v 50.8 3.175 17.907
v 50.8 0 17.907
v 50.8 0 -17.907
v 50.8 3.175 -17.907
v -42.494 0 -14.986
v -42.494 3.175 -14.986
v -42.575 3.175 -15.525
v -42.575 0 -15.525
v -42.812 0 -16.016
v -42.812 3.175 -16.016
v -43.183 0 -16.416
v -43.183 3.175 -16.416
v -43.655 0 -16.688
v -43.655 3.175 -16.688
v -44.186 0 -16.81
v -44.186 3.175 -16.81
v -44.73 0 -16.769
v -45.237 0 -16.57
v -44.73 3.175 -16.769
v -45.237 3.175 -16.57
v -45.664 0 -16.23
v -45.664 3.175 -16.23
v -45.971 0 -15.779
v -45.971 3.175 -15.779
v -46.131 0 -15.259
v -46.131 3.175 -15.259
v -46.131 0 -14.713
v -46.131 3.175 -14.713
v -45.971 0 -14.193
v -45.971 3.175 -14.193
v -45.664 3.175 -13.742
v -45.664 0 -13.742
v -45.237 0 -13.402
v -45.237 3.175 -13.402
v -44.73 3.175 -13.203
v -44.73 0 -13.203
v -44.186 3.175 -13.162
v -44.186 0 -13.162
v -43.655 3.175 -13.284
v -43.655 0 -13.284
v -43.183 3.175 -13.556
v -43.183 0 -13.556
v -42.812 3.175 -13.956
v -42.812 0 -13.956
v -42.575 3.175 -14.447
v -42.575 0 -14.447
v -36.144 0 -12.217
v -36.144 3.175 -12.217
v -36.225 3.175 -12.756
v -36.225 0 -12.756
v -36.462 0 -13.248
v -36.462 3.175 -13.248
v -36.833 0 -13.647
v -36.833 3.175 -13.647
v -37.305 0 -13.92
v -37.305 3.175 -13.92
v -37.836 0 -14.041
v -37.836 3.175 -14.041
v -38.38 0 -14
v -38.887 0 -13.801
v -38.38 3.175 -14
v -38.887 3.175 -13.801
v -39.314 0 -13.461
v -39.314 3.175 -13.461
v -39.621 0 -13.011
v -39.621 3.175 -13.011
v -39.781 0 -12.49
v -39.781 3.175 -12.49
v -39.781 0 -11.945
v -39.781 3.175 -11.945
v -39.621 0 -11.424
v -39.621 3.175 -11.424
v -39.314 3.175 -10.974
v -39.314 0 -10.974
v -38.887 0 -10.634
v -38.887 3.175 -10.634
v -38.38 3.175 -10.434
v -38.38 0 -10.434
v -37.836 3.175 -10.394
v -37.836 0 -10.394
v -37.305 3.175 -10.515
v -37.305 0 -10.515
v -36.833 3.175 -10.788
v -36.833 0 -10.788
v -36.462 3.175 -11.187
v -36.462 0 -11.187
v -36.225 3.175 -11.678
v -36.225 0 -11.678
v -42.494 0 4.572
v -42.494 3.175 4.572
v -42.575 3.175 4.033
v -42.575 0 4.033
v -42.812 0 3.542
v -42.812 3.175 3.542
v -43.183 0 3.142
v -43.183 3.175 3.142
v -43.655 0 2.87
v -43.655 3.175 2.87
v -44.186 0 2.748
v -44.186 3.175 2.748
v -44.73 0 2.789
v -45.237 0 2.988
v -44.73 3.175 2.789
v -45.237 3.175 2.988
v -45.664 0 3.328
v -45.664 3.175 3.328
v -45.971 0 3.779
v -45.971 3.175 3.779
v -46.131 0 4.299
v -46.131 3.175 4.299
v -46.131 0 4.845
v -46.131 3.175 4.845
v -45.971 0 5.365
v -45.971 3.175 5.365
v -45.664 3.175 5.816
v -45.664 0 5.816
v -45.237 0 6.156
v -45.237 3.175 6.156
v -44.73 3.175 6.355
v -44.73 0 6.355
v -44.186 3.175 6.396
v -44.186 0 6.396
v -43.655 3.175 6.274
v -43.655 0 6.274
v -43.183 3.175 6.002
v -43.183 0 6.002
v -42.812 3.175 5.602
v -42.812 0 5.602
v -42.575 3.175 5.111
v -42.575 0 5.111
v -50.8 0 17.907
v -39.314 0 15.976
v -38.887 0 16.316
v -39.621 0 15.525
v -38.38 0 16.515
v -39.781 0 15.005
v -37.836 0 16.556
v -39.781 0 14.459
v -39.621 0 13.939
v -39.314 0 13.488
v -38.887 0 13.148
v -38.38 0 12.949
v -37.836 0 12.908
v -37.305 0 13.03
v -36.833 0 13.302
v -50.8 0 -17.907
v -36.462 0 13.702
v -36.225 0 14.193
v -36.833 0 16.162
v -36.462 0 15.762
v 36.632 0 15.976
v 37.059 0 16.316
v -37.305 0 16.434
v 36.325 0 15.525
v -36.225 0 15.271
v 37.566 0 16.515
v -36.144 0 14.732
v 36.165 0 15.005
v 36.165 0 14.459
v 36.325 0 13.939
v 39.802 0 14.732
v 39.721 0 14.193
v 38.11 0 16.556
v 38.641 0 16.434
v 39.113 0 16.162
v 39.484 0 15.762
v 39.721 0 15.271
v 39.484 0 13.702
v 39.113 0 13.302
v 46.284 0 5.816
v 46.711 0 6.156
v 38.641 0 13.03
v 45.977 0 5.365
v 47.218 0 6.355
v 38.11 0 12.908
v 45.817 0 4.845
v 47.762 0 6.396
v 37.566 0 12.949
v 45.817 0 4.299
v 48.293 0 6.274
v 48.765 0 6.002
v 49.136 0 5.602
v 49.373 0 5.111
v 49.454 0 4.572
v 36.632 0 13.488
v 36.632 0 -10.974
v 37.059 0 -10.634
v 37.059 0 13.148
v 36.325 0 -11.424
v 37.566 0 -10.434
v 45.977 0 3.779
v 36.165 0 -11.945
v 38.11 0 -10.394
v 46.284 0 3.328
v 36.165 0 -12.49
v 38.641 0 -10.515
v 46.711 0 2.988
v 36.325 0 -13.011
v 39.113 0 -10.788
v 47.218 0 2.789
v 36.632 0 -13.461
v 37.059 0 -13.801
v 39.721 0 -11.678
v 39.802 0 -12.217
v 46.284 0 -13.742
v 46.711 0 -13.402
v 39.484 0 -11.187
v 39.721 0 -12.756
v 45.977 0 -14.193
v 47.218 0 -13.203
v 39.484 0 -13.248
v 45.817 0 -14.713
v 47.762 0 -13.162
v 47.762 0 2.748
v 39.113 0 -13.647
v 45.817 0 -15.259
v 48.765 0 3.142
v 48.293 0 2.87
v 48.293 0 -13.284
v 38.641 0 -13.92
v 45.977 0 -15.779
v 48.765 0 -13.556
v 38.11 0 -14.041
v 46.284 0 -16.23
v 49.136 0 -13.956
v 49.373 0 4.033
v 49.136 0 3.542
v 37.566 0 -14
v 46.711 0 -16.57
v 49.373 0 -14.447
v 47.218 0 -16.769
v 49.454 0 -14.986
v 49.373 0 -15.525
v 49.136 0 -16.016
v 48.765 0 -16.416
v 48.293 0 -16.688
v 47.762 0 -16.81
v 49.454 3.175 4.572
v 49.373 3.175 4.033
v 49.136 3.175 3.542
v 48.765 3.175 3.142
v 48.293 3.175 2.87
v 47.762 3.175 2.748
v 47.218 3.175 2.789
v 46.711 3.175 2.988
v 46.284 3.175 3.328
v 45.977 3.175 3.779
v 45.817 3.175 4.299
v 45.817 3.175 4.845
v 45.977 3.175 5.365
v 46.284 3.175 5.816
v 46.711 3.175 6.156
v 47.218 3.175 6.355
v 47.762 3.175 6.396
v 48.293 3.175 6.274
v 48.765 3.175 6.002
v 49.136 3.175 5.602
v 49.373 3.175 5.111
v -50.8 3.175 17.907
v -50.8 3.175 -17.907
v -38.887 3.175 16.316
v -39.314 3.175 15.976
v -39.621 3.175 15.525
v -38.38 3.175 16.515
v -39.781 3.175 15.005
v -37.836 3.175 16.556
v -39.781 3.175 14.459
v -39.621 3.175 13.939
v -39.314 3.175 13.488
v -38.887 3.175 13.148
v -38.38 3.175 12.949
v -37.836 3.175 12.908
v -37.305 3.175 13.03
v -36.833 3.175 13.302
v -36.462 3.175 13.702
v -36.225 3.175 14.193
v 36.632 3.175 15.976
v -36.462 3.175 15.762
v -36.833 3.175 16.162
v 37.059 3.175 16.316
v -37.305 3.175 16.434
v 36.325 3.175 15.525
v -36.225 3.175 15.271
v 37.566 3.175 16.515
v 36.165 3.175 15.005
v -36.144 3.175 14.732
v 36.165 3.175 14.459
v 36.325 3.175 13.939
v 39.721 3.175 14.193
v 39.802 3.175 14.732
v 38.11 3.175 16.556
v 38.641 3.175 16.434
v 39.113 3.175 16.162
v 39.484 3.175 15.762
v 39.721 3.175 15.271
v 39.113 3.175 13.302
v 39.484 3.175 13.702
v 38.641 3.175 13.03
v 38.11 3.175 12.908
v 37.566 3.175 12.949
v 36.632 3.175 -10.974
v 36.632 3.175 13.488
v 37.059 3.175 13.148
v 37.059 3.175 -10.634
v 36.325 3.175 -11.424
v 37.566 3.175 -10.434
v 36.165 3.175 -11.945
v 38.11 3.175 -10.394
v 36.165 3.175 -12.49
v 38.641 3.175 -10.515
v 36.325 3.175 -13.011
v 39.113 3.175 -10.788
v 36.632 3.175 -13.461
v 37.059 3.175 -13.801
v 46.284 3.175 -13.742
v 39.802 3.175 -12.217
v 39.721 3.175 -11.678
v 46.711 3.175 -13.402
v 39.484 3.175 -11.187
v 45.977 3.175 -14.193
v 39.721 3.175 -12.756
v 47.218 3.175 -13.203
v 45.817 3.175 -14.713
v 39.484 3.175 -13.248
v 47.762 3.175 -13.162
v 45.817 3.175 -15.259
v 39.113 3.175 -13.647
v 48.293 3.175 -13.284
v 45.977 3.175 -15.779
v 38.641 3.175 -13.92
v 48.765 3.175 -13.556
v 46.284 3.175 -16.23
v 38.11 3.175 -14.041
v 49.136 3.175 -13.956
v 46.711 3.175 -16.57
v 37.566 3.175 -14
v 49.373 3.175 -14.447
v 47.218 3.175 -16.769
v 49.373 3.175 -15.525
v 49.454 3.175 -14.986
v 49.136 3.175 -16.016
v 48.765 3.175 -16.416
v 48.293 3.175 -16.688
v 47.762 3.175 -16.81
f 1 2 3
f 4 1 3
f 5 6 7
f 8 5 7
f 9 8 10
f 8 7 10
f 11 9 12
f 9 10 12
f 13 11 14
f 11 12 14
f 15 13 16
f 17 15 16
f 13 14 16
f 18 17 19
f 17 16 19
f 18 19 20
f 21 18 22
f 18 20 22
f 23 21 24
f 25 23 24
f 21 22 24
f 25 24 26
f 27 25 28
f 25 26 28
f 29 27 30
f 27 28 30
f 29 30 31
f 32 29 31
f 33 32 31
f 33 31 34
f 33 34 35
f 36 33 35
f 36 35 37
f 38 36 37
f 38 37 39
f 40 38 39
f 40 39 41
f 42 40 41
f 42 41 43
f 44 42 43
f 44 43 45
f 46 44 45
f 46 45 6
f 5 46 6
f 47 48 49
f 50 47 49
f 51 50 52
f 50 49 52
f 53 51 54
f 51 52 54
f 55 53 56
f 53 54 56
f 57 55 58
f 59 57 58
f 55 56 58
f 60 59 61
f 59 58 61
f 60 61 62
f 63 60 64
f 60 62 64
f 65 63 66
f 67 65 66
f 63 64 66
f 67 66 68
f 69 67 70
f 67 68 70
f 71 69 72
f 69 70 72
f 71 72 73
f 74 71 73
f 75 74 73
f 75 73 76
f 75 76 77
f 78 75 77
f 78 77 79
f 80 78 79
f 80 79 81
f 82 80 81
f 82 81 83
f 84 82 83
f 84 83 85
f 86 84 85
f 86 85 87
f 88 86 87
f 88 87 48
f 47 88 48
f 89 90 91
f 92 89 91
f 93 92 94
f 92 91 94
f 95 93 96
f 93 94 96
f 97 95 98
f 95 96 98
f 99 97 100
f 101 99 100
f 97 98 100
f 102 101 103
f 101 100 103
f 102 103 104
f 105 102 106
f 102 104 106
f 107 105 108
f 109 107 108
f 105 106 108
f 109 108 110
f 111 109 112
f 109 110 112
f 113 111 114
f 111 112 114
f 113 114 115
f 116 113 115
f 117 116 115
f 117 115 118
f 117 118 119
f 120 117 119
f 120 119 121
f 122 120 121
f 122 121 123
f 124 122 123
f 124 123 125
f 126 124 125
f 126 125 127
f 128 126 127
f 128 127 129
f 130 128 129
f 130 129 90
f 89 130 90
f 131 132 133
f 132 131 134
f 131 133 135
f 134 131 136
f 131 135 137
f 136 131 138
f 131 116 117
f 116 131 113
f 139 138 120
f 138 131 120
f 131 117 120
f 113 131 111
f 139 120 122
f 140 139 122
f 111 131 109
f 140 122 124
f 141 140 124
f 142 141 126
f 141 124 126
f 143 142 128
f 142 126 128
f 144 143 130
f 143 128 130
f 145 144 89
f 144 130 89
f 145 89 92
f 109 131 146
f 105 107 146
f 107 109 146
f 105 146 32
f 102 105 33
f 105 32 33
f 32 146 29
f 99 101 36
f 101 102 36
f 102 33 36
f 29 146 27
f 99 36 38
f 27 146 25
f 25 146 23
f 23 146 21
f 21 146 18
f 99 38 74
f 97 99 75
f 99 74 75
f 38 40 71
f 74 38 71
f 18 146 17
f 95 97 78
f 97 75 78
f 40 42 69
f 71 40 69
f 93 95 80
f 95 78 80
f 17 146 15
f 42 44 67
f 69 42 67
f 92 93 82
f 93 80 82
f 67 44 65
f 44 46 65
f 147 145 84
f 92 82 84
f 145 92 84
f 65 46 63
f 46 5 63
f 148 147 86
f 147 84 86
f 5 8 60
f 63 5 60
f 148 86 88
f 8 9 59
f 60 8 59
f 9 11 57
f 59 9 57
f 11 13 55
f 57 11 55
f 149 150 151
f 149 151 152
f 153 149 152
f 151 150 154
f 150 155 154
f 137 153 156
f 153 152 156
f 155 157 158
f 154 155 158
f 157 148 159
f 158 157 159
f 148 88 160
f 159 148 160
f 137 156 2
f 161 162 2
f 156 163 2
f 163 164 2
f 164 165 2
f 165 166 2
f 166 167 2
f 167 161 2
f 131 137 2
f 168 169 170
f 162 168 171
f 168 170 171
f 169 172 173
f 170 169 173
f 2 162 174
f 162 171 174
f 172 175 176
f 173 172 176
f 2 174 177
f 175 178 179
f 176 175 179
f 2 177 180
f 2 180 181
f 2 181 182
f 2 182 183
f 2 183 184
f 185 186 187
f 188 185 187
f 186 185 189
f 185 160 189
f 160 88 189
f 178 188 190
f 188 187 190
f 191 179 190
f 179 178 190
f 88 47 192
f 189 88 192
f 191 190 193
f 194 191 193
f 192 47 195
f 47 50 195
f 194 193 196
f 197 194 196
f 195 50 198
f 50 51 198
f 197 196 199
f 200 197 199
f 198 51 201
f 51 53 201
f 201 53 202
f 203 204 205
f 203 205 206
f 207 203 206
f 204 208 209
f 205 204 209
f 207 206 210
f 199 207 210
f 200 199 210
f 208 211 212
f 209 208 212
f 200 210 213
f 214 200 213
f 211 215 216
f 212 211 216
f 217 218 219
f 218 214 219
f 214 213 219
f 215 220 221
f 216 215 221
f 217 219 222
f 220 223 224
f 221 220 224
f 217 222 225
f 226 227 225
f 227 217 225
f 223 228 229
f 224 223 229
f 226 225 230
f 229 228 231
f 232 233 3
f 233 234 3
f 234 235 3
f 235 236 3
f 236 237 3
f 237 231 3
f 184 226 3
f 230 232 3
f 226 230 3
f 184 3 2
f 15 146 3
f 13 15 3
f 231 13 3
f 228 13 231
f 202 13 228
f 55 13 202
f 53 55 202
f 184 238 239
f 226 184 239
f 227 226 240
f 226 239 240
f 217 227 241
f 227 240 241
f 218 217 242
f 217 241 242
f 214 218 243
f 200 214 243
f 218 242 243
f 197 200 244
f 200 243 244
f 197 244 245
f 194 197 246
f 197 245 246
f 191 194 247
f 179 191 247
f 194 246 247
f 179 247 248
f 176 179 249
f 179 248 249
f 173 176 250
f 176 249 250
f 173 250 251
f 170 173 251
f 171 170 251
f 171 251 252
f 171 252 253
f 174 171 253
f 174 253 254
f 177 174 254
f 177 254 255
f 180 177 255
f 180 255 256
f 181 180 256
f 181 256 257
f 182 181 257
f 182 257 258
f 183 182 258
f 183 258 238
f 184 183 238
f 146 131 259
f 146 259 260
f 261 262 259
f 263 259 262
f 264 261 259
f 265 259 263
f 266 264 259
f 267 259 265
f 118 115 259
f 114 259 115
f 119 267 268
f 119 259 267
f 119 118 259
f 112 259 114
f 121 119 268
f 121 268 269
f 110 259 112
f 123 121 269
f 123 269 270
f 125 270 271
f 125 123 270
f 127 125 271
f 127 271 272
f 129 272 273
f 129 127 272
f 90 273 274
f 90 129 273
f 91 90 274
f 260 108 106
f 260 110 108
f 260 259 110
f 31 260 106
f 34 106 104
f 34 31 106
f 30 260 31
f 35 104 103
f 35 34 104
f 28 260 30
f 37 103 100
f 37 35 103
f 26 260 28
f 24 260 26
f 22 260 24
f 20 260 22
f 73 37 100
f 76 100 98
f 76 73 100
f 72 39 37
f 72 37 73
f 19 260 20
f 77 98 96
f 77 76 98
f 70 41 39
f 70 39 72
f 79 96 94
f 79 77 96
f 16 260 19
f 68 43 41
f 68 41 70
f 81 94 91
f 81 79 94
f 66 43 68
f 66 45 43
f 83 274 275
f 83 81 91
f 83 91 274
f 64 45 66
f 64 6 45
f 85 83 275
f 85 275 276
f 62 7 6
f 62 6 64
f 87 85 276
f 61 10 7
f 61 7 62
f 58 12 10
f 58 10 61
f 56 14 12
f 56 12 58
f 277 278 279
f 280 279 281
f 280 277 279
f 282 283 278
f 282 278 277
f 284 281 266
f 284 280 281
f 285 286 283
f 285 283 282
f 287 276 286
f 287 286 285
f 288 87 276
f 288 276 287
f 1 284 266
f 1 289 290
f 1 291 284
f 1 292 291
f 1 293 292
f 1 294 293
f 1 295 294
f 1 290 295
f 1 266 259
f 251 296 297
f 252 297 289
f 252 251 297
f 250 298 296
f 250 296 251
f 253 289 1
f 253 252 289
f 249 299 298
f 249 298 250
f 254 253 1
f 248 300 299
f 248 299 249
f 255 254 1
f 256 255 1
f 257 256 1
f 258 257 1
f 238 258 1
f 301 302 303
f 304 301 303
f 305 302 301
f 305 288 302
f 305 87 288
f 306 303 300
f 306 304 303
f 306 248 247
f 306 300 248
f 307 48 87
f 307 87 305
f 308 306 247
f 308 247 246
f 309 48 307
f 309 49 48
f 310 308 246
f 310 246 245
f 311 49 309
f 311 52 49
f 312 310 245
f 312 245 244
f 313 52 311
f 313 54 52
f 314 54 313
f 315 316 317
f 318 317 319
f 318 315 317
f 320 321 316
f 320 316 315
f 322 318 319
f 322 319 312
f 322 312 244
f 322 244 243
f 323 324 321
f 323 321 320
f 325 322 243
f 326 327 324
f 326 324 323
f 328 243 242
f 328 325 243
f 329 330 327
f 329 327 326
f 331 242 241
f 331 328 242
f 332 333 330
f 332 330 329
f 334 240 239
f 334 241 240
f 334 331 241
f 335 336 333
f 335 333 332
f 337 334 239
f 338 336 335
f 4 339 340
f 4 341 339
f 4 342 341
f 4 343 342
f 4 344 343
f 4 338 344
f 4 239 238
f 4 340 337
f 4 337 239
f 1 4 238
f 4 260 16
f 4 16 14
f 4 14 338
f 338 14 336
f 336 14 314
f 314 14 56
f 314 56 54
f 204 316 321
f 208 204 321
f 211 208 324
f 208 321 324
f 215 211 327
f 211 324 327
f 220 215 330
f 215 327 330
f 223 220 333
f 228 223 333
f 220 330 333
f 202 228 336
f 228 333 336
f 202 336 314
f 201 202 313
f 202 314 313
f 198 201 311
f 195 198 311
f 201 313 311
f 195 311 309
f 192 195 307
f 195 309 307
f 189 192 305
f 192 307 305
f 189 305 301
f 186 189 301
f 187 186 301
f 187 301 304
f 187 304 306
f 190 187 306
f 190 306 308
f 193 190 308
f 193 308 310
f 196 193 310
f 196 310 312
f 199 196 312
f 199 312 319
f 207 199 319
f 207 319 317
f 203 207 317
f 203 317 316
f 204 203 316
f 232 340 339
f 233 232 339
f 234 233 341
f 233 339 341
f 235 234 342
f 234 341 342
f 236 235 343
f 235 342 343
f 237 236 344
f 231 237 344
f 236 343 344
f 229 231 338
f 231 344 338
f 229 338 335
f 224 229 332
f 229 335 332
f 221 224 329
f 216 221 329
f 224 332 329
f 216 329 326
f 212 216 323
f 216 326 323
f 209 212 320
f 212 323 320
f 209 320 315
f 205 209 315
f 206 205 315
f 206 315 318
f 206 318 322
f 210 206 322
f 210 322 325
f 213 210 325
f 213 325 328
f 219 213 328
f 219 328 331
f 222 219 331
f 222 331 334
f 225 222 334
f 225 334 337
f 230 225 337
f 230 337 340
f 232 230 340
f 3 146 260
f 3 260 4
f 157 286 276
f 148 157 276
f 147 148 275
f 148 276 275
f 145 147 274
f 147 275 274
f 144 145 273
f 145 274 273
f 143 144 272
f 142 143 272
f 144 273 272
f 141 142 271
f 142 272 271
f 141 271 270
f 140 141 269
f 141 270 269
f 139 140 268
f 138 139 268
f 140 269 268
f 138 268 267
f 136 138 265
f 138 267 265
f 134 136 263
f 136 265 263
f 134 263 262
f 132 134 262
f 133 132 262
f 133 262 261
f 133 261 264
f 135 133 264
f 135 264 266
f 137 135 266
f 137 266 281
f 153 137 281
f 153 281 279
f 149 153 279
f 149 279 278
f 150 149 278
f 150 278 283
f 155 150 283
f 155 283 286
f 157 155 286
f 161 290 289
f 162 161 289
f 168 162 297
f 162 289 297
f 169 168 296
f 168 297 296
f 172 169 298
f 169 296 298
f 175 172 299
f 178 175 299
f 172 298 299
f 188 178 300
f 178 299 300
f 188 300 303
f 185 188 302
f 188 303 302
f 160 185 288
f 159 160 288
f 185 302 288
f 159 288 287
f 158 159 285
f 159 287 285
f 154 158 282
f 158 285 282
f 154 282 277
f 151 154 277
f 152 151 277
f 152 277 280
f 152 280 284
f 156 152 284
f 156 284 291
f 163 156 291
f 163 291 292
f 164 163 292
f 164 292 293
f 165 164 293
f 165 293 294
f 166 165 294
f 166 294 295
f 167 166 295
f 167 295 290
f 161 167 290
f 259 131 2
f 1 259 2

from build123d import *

# Parameters (mm, degrees)
SKETCH2_W           = 101.6
SKETCH2_H           = 35.814
BOSS_EXTRUDE1_DEPTH = 3.175
SKETCH3_R           = 1.8288
CUT_EXTRUDE1_DEPTH  = 4.175
SKETCH4_R           = 1.8288
CUT_EXTRUDE2_DEPTH  = 4.175


with BuildPart() as part:
    # Sketch2 → Boss-Extrude1 (new body)
    with BuildSketch(Plane(origin=(0, 0, 0), x_dir=(1, 0, 0), z_dir=(0, 1, 0))):
        Rectangle(SKETCH2_W, SKETCH2_H)
    extrude(amount=BOSS_EXTRUDE1_DEPTH)

    # Sketch3 → Cut-Extrude1 (cut, through all)
    with BuildSketch(Plane(origin=(0, 3.175, 0), x_dir=(1, 0, 0), z_dir=(0, 1, 0))):
        with Locations((47.625, 14.986)):
            Circle(SKETCH3_R)
        with Locations((47.625, -4.572)):
            Circle(SKETCH3_R)
        with Locations((-44.323, 14.986)):
            Circle(SKETCH3_R)
        with Locations((-44.323, -4.572)):
            Circle(SKETCH3_R)
    extrude(amount=-CUT_EXTRUDE1_DEPTH, mode=Mode.SUBTRACT)

    # Sketch4 → Cut-Extrude2 (cut, through all)
    with BuildSketch(Plane(origin=(0, 3.175, 0), x_dir=(1, 0, 0), z_dir=(0, 1, 0))):
        with Locations((-37.973, -14.732)):
            Circle(SKETCH4_R)
        with Locations((-37.973, 12.2174)):
            Circle(SKETCH4_R)
        with Locations((37.973, -14.732)):
            Circle(SKETCH4_R)
        with Locations((37.973, 12.2174)):
            Circle(SKETCH4_R)
    extrude(amount=-CUT_EXTRUDE2_DEPTH, mode=Mode.SUBTRACT)


solid = part.part
